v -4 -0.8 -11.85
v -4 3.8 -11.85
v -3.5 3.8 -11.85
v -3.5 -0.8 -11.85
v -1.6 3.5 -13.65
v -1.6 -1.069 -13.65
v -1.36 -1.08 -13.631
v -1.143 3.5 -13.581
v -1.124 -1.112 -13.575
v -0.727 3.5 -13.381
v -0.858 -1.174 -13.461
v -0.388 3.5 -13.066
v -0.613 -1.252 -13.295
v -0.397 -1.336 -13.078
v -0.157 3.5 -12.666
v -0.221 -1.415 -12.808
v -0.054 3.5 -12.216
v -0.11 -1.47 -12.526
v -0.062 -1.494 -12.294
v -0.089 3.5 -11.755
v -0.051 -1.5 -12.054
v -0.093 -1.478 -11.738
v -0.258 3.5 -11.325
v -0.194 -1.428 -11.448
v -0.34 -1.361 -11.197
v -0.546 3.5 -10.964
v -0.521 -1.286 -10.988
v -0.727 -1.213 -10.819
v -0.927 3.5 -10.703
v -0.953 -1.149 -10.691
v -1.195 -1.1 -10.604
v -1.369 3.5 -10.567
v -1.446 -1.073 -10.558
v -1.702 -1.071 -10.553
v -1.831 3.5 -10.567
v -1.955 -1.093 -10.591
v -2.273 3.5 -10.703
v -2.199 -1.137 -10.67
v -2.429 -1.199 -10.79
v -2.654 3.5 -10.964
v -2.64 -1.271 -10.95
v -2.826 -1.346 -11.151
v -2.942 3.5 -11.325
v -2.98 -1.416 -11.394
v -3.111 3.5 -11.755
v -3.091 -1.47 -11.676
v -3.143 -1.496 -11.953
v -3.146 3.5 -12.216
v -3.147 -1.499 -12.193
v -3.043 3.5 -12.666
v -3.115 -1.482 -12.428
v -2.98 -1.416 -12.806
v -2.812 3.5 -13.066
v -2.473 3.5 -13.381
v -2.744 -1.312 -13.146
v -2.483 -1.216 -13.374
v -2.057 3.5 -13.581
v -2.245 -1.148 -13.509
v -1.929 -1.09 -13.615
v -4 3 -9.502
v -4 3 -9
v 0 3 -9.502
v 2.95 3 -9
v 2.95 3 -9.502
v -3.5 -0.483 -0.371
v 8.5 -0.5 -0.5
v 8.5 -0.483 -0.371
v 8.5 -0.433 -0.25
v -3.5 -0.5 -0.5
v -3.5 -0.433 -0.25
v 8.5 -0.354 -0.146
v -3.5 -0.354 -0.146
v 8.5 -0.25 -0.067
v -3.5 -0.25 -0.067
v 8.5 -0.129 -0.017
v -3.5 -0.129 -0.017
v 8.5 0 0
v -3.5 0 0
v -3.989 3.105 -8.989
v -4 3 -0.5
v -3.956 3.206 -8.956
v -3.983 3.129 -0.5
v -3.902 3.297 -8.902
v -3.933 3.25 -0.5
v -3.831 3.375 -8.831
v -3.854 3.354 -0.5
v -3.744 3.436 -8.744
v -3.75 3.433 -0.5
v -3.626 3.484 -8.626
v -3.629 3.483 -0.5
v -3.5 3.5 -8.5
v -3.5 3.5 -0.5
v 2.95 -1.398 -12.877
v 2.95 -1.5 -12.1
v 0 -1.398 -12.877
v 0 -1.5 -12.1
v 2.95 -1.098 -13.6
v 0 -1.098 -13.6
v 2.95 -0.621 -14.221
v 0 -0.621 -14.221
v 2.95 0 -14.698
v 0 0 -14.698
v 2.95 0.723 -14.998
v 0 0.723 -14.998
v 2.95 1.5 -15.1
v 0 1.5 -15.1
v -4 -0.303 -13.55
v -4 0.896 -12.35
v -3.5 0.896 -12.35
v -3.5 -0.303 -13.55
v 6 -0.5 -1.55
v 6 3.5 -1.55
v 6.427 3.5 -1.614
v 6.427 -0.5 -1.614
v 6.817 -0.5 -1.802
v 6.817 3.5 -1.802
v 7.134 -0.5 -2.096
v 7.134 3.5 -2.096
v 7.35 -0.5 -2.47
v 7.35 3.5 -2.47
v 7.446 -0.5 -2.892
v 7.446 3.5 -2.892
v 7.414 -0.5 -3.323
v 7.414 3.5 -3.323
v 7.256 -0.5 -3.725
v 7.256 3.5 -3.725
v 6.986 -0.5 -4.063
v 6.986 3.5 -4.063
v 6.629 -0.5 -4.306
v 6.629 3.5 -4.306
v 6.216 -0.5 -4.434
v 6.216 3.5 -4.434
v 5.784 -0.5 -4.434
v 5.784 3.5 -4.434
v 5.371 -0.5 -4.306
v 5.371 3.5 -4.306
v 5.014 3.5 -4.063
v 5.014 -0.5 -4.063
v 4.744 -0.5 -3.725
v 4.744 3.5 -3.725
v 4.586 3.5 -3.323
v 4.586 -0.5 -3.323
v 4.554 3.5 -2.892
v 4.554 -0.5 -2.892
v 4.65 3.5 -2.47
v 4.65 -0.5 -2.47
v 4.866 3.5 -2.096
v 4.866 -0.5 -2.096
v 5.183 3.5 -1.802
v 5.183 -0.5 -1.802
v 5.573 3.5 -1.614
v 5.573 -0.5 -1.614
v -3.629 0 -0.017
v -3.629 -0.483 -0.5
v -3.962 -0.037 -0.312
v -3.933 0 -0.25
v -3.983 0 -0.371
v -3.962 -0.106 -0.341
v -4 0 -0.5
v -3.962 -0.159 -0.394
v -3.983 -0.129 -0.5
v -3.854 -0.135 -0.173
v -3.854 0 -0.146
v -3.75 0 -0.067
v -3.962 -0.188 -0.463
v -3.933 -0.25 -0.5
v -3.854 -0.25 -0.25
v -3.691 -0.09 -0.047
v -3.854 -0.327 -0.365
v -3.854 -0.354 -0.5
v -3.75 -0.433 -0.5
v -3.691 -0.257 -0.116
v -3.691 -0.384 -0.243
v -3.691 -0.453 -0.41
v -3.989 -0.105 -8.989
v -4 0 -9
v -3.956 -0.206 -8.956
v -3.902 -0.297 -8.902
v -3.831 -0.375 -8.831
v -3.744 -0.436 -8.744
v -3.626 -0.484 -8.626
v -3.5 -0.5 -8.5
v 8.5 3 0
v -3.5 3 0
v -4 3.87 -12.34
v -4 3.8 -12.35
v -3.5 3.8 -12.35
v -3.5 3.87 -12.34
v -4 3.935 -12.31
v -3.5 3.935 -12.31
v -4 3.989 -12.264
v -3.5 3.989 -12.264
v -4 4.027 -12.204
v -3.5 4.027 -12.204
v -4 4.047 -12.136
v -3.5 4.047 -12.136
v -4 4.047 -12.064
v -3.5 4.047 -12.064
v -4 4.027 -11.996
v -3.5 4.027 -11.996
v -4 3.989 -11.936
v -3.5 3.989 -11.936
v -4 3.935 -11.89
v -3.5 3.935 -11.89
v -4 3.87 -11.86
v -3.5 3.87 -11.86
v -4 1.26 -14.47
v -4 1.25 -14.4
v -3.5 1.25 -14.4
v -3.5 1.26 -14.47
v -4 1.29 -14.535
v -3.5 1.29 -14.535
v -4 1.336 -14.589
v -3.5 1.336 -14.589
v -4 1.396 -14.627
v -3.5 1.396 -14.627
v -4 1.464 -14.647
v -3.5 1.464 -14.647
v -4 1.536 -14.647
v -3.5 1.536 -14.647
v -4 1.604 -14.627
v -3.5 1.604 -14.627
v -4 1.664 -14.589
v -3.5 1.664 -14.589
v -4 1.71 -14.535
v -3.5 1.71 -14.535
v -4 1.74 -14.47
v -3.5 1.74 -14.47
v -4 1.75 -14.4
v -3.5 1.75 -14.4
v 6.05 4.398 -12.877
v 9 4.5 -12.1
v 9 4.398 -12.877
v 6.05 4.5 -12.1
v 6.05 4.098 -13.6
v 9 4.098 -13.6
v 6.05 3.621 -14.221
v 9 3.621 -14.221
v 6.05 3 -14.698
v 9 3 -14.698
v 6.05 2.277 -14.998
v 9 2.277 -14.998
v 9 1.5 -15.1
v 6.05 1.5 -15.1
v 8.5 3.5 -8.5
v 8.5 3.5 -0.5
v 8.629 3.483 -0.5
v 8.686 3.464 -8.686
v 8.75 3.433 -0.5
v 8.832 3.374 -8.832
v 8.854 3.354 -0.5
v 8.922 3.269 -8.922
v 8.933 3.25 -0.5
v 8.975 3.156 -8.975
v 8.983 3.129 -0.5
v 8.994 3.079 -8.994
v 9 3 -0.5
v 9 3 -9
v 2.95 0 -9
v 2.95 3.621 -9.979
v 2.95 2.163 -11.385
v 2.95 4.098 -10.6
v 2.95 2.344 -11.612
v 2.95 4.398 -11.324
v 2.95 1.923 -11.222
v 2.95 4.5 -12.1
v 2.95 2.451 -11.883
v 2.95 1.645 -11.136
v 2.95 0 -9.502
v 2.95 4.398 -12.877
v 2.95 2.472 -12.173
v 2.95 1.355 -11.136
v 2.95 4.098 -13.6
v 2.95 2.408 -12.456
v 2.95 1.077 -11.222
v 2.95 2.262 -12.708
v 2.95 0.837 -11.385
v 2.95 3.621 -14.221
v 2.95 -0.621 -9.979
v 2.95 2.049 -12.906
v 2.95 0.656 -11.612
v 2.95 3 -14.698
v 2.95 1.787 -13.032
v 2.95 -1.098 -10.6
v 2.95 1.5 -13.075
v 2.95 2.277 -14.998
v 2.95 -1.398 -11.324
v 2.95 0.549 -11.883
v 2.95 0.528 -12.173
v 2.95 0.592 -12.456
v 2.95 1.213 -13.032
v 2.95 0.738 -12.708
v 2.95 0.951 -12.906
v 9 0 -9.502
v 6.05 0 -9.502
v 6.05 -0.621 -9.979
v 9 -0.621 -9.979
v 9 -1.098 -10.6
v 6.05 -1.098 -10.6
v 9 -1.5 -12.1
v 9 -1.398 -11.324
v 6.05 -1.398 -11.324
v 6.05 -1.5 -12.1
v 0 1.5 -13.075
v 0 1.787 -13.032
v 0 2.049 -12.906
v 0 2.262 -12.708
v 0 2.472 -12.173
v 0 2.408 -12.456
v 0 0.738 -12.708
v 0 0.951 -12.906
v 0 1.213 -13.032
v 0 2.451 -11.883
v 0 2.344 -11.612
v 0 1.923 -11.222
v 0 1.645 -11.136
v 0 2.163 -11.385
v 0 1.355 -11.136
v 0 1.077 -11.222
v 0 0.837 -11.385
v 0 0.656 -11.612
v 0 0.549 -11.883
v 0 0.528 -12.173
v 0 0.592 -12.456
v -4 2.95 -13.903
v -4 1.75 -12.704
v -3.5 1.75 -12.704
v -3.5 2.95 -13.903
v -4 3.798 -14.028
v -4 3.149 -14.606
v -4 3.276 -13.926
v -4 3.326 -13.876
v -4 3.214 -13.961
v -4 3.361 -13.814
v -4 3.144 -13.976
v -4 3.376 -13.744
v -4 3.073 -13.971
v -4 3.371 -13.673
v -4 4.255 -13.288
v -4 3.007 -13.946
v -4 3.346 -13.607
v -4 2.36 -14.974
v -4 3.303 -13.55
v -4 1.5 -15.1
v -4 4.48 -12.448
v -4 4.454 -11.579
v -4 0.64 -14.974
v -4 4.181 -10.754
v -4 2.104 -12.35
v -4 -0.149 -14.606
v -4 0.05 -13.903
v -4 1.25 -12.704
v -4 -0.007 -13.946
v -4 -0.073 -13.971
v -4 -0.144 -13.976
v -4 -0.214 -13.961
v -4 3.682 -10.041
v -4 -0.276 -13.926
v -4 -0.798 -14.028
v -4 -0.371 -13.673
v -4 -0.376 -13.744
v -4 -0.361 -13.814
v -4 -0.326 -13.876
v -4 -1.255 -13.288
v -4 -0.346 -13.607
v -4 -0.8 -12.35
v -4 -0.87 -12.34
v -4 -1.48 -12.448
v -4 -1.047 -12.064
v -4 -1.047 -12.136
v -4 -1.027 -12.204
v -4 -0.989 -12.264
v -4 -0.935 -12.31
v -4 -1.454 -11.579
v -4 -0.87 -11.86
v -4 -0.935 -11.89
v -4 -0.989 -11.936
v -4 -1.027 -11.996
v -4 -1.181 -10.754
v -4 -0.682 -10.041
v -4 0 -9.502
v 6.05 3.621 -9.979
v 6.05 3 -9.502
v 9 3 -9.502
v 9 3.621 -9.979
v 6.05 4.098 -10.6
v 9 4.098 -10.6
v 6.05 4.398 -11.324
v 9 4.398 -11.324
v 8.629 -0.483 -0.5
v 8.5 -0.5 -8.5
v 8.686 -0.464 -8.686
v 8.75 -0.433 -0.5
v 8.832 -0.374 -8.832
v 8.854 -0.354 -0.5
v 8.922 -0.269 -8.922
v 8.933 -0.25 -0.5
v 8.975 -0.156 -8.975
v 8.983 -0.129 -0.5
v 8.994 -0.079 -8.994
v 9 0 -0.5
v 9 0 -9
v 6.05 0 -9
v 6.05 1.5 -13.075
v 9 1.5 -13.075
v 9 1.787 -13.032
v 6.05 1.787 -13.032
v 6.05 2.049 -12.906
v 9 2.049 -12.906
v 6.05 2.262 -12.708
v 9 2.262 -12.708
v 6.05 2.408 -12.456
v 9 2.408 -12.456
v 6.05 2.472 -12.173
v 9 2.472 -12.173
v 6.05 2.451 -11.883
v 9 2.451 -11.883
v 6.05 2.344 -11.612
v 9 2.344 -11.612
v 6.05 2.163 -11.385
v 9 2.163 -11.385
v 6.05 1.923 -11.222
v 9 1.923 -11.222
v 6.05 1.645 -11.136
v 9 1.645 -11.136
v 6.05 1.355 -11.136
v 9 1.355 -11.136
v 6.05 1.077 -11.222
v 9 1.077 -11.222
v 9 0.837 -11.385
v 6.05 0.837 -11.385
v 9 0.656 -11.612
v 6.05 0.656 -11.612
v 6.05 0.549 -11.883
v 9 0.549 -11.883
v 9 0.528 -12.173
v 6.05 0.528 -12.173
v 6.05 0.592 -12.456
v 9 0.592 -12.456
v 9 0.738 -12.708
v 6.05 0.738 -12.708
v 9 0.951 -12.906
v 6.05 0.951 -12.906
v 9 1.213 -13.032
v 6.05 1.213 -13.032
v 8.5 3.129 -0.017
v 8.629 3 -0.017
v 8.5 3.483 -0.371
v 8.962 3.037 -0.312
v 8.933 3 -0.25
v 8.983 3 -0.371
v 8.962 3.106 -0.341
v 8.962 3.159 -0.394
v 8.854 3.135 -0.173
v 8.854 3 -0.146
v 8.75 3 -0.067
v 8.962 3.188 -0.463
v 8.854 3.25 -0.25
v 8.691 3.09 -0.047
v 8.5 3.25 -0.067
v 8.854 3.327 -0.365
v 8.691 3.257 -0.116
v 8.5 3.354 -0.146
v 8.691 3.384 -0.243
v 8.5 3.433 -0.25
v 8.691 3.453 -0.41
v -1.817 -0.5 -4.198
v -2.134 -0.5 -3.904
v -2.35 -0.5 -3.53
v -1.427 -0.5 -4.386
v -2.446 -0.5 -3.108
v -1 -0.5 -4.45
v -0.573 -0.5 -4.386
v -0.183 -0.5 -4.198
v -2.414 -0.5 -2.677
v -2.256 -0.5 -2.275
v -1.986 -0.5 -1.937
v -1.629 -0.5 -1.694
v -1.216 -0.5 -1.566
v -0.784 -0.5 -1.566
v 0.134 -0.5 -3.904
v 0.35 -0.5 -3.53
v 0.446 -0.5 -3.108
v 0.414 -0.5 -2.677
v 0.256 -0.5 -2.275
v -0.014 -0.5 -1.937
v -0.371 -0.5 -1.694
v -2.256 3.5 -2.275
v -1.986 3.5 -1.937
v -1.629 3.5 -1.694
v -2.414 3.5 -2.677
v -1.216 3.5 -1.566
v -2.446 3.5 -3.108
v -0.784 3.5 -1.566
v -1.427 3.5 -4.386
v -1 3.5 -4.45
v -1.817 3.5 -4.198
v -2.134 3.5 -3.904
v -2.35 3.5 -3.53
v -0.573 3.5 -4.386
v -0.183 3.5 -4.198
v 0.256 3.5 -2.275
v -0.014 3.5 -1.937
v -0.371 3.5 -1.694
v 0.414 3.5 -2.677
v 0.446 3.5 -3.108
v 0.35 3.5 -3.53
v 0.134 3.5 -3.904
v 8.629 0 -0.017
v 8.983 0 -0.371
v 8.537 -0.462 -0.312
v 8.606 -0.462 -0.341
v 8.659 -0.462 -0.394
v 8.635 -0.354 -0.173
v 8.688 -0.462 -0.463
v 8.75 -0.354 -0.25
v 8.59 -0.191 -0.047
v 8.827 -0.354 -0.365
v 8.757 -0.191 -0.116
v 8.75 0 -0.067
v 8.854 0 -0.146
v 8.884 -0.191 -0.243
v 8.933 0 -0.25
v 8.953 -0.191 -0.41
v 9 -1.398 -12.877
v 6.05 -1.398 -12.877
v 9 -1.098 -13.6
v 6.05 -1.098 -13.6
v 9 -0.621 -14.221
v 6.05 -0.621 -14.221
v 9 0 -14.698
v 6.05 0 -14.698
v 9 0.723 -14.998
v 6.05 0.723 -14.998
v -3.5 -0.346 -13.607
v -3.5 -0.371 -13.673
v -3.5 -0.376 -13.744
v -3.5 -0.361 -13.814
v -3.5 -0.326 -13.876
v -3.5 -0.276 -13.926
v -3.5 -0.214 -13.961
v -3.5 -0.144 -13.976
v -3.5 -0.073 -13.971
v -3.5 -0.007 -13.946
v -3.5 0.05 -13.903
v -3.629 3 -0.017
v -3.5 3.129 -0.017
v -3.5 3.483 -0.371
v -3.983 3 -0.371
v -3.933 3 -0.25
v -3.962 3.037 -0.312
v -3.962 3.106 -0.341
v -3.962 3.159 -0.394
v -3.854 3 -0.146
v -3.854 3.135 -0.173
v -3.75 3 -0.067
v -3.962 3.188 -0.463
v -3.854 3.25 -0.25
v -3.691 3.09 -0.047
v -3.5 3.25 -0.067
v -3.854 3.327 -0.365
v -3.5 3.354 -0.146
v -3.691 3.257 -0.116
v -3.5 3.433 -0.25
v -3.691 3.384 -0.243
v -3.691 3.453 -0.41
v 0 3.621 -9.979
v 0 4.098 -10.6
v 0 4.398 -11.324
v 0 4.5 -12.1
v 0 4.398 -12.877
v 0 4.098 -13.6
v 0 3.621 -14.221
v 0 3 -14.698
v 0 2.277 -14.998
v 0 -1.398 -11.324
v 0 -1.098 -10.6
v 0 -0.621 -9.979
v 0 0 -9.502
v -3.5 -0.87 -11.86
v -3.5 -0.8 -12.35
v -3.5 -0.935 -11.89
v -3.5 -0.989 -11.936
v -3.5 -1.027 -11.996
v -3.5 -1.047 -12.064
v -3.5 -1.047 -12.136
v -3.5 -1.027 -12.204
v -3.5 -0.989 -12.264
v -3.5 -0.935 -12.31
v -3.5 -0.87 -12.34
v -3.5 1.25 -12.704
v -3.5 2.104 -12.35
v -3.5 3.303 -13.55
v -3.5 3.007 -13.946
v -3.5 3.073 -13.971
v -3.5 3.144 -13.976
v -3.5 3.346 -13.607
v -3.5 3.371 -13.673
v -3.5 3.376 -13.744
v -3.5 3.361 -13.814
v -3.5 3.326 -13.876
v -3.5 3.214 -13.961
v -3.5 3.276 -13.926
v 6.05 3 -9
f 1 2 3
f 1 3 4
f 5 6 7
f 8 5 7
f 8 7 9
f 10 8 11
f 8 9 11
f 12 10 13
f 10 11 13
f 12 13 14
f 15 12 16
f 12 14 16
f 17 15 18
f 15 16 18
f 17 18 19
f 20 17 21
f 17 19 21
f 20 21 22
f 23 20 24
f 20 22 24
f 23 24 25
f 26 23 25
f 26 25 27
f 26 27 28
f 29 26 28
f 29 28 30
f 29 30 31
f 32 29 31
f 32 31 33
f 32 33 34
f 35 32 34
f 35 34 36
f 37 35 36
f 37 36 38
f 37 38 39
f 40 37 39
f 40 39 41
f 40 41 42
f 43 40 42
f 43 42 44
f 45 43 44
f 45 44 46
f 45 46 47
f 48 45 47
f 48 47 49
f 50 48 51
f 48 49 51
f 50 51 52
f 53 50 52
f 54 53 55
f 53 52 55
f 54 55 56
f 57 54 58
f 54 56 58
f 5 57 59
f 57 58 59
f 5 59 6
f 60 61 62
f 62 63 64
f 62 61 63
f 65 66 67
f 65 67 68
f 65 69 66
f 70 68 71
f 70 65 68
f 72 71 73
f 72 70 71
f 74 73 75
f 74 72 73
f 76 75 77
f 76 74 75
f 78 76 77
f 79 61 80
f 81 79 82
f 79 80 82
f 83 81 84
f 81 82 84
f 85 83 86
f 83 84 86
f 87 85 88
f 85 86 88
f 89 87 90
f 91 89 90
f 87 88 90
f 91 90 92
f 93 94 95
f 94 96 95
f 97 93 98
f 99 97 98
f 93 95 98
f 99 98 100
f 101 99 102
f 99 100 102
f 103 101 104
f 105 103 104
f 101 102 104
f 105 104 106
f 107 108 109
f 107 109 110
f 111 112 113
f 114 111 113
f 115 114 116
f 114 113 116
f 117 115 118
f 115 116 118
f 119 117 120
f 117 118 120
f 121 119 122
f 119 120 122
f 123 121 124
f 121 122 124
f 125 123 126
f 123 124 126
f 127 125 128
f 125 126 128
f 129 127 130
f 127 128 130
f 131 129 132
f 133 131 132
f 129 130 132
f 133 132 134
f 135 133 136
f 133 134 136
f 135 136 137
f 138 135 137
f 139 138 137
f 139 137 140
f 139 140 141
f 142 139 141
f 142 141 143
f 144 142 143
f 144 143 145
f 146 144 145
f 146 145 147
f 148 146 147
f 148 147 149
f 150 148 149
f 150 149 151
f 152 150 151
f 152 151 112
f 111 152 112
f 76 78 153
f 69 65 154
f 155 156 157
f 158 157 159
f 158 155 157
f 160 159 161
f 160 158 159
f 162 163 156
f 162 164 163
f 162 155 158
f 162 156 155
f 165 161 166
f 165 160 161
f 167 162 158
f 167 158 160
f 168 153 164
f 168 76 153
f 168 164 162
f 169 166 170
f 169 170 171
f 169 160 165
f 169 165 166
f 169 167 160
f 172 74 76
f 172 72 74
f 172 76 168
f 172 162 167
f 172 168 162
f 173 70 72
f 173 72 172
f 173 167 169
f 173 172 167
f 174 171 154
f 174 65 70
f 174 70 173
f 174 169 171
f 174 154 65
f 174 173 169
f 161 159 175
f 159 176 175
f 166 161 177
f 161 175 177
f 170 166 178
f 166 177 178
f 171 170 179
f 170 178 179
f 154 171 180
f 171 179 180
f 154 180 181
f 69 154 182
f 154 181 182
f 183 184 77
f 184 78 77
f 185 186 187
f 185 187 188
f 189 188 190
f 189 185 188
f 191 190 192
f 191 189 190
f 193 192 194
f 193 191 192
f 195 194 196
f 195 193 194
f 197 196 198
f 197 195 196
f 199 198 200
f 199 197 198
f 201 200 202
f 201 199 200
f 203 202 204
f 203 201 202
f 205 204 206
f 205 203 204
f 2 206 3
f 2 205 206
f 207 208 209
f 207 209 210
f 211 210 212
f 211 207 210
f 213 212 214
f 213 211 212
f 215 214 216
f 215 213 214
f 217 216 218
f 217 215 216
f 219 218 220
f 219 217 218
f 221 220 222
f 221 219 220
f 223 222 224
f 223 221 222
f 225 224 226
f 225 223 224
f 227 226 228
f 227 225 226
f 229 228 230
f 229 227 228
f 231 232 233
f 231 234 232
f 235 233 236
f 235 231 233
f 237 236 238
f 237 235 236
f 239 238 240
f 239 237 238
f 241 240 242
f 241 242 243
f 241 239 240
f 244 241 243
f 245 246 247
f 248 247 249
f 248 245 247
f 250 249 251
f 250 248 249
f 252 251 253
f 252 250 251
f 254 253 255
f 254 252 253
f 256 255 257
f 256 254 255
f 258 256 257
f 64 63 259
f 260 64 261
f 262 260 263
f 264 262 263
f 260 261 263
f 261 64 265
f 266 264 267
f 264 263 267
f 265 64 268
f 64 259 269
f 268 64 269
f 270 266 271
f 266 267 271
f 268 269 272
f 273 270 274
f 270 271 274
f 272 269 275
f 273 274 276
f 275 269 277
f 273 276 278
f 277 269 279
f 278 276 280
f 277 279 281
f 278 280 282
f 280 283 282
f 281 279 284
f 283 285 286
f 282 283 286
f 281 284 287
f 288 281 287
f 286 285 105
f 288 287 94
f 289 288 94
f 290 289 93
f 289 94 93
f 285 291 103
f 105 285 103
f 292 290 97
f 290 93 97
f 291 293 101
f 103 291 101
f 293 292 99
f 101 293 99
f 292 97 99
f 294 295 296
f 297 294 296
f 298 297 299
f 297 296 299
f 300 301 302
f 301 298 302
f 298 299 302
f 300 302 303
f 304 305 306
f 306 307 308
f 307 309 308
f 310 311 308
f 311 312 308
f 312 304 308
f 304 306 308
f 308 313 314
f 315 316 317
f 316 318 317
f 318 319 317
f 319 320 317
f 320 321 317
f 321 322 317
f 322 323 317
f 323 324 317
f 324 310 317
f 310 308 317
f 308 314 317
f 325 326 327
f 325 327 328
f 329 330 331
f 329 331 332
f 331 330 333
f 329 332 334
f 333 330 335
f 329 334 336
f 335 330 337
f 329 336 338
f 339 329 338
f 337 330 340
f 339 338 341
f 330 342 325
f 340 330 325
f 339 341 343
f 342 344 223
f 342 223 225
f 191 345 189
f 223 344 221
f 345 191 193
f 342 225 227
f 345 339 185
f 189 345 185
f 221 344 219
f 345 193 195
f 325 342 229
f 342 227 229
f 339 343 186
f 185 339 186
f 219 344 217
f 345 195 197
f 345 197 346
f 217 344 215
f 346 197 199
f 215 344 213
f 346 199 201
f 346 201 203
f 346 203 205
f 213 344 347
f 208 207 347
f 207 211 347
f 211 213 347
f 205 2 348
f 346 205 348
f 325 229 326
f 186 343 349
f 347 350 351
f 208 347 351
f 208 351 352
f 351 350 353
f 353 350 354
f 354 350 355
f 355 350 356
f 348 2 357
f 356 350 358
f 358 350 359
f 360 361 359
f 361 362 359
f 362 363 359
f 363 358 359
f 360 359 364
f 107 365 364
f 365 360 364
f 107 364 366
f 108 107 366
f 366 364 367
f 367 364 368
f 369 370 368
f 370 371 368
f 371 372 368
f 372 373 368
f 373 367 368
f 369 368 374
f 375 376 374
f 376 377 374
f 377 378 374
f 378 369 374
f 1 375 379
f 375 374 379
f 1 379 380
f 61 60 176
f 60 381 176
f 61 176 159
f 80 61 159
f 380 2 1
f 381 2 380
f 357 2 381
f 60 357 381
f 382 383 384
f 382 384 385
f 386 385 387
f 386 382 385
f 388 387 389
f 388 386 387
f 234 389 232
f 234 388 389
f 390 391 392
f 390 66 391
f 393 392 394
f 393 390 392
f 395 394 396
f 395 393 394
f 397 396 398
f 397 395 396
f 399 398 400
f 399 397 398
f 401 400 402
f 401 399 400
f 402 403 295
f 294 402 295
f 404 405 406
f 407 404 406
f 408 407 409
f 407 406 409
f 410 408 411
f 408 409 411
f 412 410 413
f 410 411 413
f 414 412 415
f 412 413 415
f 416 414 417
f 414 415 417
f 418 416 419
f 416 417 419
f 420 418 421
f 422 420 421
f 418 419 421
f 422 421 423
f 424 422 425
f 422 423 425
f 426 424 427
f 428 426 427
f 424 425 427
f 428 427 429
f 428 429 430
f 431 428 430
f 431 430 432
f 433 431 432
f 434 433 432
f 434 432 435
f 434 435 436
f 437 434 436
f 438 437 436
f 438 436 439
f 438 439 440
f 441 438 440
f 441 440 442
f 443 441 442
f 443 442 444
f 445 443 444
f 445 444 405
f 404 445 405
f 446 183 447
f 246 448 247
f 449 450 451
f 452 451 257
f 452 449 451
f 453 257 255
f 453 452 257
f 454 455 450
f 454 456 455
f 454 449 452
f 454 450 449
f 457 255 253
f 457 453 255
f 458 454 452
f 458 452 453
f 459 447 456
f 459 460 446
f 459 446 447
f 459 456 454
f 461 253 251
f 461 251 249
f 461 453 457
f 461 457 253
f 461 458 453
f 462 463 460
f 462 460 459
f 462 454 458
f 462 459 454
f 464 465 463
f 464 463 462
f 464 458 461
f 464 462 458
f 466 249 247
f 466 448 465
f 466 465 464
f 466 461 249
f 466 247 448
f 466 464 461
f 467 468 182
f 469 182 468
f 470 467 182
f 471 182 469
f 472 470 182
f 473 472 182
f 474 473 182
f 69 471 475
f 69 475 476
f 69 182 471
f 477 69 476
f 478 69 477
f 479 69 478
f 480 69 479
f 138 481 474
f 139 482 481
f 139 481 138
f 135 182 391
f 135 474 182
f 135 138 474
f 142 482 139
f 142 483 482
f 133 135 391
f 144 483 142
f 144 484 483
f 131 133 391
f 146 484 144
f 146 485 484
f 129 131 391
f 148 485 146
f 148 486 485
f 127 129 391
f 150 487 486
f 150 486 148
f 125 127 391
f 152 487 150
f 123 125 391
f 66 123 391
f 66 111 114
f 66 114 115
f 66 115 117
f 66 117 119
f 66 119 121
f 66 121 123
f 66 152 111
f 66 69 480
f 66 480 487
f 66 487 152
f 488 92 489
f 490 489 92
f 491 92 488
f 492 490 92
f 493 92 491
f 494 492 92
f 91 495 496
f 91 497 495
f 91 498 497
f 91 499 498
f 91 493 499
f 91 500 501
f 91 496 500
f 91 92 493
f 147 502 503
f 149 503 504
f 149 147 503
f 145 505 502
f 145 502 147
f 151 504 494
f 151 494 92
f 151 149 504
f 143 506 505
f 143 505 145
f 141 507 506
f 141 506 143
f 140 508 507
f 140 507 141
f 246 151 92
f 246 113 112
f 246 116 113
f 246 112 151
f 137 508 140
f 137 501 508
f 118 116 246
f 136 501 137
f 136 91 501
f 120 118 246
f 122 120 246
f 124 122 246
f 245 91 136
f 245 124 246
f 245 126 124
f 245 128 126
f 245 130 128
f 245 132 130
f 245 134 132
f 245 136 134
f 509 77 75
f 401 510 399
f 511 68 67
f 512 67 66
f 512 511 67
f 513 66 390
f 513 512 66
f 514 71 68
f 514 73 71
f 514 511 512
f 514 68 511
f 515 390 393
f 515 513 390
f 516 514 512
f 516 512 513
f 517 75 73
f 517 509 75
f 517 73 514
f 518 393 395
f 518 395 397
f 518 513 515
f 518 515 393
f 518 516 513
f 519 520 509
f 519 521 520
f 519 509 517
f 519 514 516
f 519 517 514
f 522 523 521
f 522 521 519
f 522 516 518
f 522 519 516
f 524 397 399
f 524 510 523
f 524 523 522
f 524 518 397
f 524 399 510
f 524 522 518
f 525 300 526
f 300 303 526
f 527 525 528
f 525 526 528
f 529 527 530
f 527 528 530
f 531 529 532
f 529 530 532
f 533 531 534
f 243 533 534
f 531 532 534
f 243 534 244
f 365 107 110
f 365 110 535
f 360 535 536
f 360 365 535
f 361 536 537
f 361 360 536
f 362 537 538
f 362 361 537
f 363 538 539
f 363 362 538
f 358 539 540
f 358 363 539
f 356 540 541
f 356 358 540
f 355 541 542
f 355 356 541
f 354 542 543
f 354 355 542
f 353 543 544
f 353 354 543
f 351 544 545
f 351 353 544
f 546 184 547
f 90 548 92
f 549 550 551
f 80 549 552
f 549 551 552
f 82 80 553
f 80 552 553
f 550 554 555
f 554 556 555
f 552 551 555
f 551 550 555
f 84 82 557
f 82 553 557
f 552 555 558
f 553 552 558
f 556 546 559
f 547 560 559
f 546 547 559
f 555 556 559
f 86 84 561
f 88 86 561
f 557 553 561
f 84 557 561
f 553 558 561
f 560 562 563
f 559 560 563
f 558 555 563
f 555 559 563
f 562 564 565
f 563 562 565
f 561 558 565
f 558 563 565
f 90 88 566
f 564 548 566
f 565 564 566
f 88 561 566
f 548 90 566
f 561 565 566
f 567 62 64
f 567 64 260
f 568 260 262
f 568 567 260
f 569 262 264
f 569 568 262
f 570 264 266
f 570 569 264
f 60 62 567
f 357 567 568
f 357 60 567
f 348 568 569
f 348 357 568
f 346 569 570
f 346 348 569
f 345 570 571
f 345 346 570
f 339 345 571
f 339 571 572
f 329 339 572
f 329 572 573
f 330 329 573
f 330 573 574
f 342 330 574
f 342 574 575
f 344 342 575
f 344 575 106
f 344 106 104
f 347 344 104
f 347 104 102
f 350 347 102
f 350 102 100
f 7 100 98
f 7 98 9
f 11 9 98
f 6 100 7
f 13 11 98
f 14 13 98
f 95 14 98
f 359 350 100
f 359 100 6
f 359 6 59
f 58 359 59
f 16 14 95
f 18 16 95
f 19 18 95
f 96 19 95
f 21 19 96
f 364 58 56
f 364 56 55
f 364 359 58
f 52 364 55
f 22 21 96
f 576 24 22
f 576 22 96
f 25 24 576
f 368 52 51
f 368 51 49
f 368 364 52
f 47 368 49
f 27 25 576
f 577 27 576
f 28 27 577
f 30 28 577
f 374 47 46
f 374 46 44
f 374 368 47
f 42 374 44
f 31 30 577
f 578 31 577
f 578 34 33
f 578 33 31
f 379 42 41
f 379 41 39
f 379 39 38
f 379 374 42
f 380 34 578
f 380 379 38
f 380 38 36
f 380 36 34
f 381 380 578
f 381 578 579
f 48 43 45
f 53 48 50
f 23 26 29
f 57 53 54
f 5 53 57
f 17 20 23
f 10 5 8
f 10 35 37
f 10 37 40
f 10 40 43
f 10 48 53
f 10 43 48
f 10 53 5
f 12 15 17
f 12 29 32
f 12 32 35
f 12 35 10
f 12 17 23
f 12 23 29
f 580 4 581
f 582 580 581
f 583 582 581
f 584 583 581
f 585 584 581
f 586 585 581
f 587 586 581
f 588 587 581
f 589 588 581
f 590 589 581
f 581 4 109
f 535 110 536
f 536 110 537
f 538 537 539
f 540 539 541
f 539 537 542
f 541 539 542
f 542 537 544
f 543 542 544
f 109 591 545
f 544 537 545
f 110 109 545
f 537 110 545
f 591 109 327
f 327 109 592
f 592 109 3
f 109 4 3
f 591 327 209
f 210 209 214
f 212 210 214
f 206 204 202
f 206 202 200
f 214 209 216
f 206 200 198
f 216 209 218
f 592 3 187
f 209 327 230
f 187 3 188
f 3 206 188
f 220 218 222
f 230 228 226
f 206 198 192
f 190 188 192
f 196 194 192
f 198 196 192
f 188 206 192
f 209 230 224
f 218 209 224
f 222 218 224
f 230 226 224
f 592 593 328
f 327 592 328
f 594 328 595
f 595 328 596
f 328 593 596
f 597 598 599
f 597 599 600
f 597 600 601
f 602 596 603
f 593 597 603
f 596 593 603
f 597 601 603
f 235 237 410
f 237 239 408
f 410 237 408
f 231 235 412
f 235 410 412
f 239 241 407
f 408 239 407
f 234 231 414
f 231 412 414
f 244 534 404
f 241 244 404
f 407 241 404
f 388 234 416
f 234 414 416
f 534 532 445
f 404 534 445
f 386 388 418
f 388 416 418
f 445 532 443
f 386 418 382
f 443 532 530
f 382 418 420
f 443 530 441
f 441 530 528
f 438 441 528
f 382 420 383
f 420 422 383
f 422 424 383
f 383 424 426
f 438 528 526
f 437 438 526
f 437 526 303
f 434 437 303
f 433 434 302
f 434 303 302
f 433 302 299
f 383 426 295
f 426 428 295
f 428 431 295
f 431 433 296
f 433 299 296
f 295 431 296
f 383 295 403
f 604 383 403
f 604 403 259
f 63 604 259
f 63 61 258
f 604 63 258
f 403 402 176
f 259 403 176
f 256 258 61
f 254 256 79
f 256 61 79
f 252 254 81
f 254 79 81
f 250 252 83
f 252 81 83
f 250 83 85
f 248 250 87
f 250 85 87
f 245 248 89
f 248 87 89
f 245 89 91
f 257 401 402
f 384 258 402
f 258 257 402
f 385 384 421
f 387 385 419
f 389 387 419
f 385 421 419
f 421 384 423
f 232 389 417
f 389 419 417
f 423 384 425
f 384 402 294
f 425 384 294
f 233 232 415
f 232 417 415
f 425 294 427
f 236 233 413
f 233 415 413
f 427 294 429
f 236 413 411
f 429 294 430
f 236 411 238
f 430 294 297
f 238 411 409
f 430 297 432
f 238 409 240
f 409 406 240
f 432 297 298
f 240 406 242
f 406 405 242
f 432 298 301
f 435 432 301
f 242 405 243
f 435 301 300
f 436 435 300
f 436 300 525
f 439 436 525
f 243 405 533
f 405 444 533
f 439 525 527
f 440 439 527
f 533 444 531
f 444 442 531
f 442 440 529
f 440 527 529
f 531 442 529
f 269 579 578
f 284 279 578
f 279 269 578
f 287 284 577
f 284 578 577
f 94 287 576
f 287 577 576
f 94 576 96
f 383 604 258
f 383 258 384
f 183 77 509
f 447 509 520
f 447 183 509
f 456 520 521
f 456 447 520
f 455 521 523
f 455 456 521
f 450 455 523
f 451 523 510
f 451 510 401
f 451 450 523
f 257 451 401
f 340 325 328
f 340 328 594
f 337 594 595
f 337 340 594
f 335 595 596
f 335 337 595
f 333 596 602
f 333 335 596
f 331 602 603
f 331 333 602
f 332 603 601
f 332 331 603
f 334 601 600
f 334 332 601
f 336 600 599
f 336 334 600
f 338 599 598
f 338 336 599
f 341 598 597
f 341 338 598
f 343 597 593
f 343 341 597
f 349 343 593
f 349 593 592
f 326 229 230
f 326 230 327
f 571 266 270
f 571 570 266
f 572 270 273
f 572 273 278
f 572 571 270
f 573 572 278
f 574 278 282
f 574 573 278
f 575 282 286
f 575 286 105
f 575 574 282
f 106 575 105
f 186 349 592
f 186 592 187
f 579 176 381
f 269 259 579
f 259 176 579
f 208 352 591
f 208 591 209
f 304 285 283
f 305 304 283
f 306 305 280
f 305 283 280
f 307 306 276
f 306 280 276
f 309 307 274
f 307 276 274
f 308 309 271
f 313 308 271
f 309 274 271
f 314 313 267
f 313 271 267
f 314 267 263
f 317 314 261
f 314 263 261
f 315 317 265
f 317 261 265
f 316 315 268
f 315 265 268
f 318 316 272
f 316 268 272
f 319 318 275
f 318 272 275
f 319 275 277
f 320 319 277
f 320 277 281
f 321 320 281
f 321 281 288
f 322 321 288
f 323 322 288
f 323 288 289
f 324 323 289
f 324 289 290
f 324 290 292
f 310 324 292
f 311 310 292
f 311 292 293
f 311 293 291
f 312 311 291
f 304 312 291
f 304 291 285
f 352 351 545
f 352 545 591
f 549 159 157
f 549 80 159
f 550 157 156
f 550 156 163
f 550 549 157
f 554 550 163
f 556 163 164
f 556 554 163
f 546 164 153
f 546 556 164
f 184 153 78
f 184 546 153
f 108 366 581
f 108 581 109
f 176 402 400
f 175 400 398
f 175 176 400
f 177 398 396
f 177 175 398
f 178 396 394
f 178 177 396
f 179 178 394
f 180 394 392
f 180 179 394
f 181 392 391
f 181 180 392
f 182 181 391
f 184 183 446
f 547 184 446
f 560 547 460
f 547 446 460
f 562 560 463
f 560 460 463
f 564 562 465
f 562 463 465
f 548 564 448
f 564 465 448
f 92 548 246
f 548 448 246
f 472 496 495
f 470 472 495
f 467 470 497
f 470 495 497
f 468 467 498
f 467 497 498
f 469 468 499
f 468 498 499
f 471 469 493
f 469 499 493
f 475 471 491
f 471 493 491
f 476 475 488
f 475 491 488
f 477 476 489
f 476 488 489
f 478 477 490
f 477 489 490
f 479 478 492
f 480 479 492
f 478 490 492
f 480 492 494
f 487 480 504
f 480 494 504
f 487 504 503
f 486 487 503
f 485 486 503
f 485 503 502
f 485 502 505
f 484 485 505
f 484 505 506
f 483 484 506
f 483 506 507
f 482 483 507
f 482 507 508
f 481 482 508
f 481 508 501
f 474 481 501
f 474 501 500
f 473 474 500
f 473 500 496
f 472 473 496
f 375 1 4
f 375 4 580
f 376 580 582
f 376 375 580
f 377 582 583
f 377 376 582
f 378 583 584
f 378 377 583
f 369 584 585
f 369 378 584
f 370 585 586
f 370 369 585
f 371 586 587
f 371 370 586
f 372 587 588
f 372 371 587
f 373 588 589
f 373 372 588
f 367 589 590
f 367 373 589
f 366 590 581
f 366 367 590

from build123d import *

# Parameters (mm, degrees)
SKETCH1_W           = 9
SKETCH1_H           = 9
BOSS_EXTRUDE1_DEPTH = 3
SKETCH2_W           = 2.95
SKETCH2_H           = 6
BOSS_EXTRUDE2_DEPTH = 6.1
FILLET1_R           = 3
SKETCH3_R           = 0.975
CUT_EXTRUDE1_DEPTH  = 11.1
CUT_EXTRUDE3_DEPTH  = 21.1
BOSS_EXTRUDE3_START = 4
SKETCH5_R           = 3
BOSS_EXTRUDE3_DEPTH = 4
SKETCH8_R           = 1.55
CUT_EXTRUDE4_DEPTH  = 5
CUT_EXTRUDE5_DEPTH  = 0.5
BOSS_EXTRUDE4_START = 4
BOSS_EXTRUDE4_DEPTH = 4
BOSS_EXTRUDE5_DEPTH = 0.5
BOSS_EXTRUDE6_DEPTH = 0.5
SKETCH15_W          = 0.501923789
SKETCH15_H          = 0.5
CUT_EXTRUDE6_DEPTH  = 19.5
SKETCH16_R          = 1.45
CUT_EXTRUDE7_DEPTH  = 19.5
FILLET2_R           = 0.5


with BuildPart() as part:
    # Sketch1 → Boss-Extrude1 (new body)
    with BuildSketch(Plane(origin=(0, 0, 0), x_dir=(1, 0, 0), z_dir=(0, 1, 0))):
        with Locations((4.5, 4.5)):
            Rectangle(SKETCH1_W, SKETCH1_H)
    extrude(amount=BOSS_EXTRUDE1_DEPTH)

    # Sketch2 → Boss-Extrude2 (add)
    with BuildSketch(Plane(origin=(0, 0, -9), x_dir=(-1, 0, 0), z_dir=(0, 0, -1))):
        with Locations((-7.525, 1.5)):
            Rectangle(SKETCH2_W, SKETCH2_H)
        with Locations((-1.475, 1.5)):
            Rectangle(SKETCH2_W, SKETCH2_H)
    extrude(amount=BOSS_EXTRUDE2_DEPTH)

    # Fillet1
    fillet1_edges = [part.edges().sort_by_distance(p)[0] for p in [
        (1.475, 4.5, -15.1),
        (1.475, -1.5, -15.1),
        (7.525, -1.5, -15.1),
        (7.525, 4.5, -15.1),
    ]]
    fillet(fillet1_edges, radius=FILLET1_R - 0.0001)  # a hair under: the kernel refuses the full size

    # Sketch3 → Cut-Extrude1 (cut)
    with BuildSketch(Plane(origin=(9, 0, 0), x_dir=(0, 0, -1), z_dir=(1, 0, 0))):
        with Locations((12.1, 1.5)):
            Circle(SKETCH3_R)
    extrude(amount=-CUT_EXTRUDE1_DEPTH, mode=Mode.SUBTRACT)

    # Sketch6 → Cut-Extrude3 (cut)
    with BuildSketch(Plane.ZY):
        with BuildLine():
            Line((-12.1, 4.5), (-9, 4.5))
            Line((-9, 4.5), (-9, 3))
            Line((-9, 3), (-9.501923789, 3))
            ThreePointArc((-9.501923789, 3), (-10.6, 4.098076211), (-12.1, 4.5))
        make_face()
        with BuildLine():
            Line((-12.1, -1.5), (-9, -1.5))
            Line((-9, -1.5), (-9, 0))
            Line((-9, 0), (-9.501923789, 0))
            ThreePointArc((-9.501923789, 0), (-10.6, -1.098076211), (-12.1, -1.5))
        make_face()
    extrude(amount=-CUT_EXTRUDE3_DEPTH, mode=Mode.SUBTRACT)

    # Sketch5 → Boss-Extrude3 (add)
    with BuildSketch(Plane.ZY.offset(BOSS_EXTRUDE3_START)):
        with Locations((-12.1, 1.5)):
            Circle(SKETCH5_R)
    extrude(amount=-BOSS_EXTRUDE3_DEPTH)

    # Sketch8 → Cut-Extrude4 (cut)
    with BuildSketch(Plane(origin=(0, -1.5, 0), x_dir=(-1, 0, 0), z_dir=(0, -1, 0))):
        with Locations(Location((1.6, 12.1, 0), (0, 0, 90))):
            Circle(SKETCH8_R)
    extrude(amount=-CUT_EXTRUDE4_DEPTH, mode=Mode.SUBTRACT)

    # Sketch9 → Cut-Extrude5 (cut)
    with BuildSketch(Plane.ZY.offset(4)):
        with BuildLine():
            Line((-11.85, 1.5), (-11.85, -0.8))
            ThreePointArc((-11.85, -0.8), (-12.1, -1.05), (-12.35, -0.8))
            Line((-12.35, -0.8), (-12.35, 0.896446609))
            Line((-12.35, 0.896446609), (-13.549568901, -0.303122292))
            ThreePointArc((-13.549568901, -0.303122292), (-13.903122292, -0.303122292), (-13.903122292, 0.050431099))
            Line((-13.903122292, 0.050431099), (-12.703553391, 1.25))
            Line((-12.703553391, 1.25), (-14.4, 1.25))
            ThreePointArc((-14.4, 1.25), (-14.65, 1.5), (-14.4, 1.75))
            Line((-14.4, 1.75), (-12.703553391, 1.75))
            Line((-12.703553391, 1.75), (-13.903122292, 2.949568901))
            ThreePointArc((-13.903122292, 2.949568901), (-13.903122292, 3.303122292), (-13.549568901, 3.303122292))
            Line((-13.549568901, 3.303122292), (-12.35, 2.103553391))
            Line((-12.35, 2.103553391), (-12.35, 3.8))
            ThreePointArc((-12.35, 3.8), (-12.1, 4.05), (-11.85, 3.8))
            Line((-11.85, 3.8), (-11.85, 1.5))
        make_face()
    extrude(amount=-CUT_EXTRUDE5_DEPTH, mode=Mode.SUBTRACT)

    # Sketch10 → Boss-Extrude4 (add)
    with BuildSketch(Plane.ZY.offset(BOSS_EXTRUDE4_START)):
        with BuildLine():
            Line((-9.501923789, 0), (0, 0))
            Line((0, 0), (0, 3))
            Line((0, 3), (-9.501923789, 3))
            ThreePointArc((-9.501923789, 3), (-9.1, 1.5), (-9.501923789, 0))
        make_face()
    extrude(amount=-BOSS_EXTRUDE4_DEPTH)

    # Sketch12 → Boss-Extrude5 (add)
    with BuildSketch(Plane.XZ):
        Polygon((9, 0), (-4, 0), (-4, -9.501923789), (2.95, -9.501923789), (2.95, -9), (6.05, -9), (6.05, -9.501923789), (9, -9.501923789), align=None)
    extrude(amount=BOSS_EXTRUDE5_DEPTH)

    # Sketch13 → Boss-Extrude6 (add)
    with BuildSketch(Plane(origin=(0, 3, 0), x_dir=(1, 0, 0), z_dir=(0, 1, 0))):
        Polygon((2.95, 9.501923789), (-4, 9.501923789), (-4, 0), (9, 0), (9, 9.501923789), (6.05, 9.501923789), (6.05, 9), (2.95, 9), align=None)
    extrude(amount=BOSS_EXTRUDE6_DEPTH)

    # Sketch15 → Cut-Extrude6 (cut)
    with BuildSketch(Plane(origin=(9, 0, 0), x_dir=(0, 0, -1), z_dir=(1, 0, 0))):
        with Locations((9.250961895, 3.25)):
            Rectangle(SKETCH15_W, SKETCH15_H)
        with Locations((9.250961895, -0.25)):
            Rectangle(SKETCH15_W, SKETCH15_H)
    extrude(amount=-CUT_EXTRUDE6_DEPTH, mode=Mode.SUBTRACT)

    # Sketch16 → Cut-Extrude7 (cut)
    with BuildSketch(Plane(origin=(0, 3.5, 0), x_dir=(1, 0, 0), z_dir=(0, 1, 0))):
        with Locations(Location((6, 3, 0), (0, 0, 270))):
            Circle(SKETCH16_R)
        with Locations(Location((-1, 3, 0), (0, 0, 90))):
            Circle(SKETCH16_R)
    extrude(amount=-CUT_EXTRUDE7_DEPTH, mode=Mode.SUBTRACT)

    # Fillet2
    fillet2_edges = [part.edges().sort_by_distance(p)[0] for p in [
        (2.5, 3.5, 0),
        (9, 1.25, 0),
        (2.5, -0.5, 0),
        (-4, 1.5, 0),
        (-4, -0.5, -4.5),
        (-4, 3.5, -4.5),
        (9, 3.5, -4.5),
        (9, -0.5, -4.5),
        (2.5, 3.5, -9),
        (2.5, -0.5, -9),
    ]]
    fillet(fillet2_edges, radius=FILLET2_R - 0.0001)  # a hair under: the kernel refuses the full size


solid = part.part
